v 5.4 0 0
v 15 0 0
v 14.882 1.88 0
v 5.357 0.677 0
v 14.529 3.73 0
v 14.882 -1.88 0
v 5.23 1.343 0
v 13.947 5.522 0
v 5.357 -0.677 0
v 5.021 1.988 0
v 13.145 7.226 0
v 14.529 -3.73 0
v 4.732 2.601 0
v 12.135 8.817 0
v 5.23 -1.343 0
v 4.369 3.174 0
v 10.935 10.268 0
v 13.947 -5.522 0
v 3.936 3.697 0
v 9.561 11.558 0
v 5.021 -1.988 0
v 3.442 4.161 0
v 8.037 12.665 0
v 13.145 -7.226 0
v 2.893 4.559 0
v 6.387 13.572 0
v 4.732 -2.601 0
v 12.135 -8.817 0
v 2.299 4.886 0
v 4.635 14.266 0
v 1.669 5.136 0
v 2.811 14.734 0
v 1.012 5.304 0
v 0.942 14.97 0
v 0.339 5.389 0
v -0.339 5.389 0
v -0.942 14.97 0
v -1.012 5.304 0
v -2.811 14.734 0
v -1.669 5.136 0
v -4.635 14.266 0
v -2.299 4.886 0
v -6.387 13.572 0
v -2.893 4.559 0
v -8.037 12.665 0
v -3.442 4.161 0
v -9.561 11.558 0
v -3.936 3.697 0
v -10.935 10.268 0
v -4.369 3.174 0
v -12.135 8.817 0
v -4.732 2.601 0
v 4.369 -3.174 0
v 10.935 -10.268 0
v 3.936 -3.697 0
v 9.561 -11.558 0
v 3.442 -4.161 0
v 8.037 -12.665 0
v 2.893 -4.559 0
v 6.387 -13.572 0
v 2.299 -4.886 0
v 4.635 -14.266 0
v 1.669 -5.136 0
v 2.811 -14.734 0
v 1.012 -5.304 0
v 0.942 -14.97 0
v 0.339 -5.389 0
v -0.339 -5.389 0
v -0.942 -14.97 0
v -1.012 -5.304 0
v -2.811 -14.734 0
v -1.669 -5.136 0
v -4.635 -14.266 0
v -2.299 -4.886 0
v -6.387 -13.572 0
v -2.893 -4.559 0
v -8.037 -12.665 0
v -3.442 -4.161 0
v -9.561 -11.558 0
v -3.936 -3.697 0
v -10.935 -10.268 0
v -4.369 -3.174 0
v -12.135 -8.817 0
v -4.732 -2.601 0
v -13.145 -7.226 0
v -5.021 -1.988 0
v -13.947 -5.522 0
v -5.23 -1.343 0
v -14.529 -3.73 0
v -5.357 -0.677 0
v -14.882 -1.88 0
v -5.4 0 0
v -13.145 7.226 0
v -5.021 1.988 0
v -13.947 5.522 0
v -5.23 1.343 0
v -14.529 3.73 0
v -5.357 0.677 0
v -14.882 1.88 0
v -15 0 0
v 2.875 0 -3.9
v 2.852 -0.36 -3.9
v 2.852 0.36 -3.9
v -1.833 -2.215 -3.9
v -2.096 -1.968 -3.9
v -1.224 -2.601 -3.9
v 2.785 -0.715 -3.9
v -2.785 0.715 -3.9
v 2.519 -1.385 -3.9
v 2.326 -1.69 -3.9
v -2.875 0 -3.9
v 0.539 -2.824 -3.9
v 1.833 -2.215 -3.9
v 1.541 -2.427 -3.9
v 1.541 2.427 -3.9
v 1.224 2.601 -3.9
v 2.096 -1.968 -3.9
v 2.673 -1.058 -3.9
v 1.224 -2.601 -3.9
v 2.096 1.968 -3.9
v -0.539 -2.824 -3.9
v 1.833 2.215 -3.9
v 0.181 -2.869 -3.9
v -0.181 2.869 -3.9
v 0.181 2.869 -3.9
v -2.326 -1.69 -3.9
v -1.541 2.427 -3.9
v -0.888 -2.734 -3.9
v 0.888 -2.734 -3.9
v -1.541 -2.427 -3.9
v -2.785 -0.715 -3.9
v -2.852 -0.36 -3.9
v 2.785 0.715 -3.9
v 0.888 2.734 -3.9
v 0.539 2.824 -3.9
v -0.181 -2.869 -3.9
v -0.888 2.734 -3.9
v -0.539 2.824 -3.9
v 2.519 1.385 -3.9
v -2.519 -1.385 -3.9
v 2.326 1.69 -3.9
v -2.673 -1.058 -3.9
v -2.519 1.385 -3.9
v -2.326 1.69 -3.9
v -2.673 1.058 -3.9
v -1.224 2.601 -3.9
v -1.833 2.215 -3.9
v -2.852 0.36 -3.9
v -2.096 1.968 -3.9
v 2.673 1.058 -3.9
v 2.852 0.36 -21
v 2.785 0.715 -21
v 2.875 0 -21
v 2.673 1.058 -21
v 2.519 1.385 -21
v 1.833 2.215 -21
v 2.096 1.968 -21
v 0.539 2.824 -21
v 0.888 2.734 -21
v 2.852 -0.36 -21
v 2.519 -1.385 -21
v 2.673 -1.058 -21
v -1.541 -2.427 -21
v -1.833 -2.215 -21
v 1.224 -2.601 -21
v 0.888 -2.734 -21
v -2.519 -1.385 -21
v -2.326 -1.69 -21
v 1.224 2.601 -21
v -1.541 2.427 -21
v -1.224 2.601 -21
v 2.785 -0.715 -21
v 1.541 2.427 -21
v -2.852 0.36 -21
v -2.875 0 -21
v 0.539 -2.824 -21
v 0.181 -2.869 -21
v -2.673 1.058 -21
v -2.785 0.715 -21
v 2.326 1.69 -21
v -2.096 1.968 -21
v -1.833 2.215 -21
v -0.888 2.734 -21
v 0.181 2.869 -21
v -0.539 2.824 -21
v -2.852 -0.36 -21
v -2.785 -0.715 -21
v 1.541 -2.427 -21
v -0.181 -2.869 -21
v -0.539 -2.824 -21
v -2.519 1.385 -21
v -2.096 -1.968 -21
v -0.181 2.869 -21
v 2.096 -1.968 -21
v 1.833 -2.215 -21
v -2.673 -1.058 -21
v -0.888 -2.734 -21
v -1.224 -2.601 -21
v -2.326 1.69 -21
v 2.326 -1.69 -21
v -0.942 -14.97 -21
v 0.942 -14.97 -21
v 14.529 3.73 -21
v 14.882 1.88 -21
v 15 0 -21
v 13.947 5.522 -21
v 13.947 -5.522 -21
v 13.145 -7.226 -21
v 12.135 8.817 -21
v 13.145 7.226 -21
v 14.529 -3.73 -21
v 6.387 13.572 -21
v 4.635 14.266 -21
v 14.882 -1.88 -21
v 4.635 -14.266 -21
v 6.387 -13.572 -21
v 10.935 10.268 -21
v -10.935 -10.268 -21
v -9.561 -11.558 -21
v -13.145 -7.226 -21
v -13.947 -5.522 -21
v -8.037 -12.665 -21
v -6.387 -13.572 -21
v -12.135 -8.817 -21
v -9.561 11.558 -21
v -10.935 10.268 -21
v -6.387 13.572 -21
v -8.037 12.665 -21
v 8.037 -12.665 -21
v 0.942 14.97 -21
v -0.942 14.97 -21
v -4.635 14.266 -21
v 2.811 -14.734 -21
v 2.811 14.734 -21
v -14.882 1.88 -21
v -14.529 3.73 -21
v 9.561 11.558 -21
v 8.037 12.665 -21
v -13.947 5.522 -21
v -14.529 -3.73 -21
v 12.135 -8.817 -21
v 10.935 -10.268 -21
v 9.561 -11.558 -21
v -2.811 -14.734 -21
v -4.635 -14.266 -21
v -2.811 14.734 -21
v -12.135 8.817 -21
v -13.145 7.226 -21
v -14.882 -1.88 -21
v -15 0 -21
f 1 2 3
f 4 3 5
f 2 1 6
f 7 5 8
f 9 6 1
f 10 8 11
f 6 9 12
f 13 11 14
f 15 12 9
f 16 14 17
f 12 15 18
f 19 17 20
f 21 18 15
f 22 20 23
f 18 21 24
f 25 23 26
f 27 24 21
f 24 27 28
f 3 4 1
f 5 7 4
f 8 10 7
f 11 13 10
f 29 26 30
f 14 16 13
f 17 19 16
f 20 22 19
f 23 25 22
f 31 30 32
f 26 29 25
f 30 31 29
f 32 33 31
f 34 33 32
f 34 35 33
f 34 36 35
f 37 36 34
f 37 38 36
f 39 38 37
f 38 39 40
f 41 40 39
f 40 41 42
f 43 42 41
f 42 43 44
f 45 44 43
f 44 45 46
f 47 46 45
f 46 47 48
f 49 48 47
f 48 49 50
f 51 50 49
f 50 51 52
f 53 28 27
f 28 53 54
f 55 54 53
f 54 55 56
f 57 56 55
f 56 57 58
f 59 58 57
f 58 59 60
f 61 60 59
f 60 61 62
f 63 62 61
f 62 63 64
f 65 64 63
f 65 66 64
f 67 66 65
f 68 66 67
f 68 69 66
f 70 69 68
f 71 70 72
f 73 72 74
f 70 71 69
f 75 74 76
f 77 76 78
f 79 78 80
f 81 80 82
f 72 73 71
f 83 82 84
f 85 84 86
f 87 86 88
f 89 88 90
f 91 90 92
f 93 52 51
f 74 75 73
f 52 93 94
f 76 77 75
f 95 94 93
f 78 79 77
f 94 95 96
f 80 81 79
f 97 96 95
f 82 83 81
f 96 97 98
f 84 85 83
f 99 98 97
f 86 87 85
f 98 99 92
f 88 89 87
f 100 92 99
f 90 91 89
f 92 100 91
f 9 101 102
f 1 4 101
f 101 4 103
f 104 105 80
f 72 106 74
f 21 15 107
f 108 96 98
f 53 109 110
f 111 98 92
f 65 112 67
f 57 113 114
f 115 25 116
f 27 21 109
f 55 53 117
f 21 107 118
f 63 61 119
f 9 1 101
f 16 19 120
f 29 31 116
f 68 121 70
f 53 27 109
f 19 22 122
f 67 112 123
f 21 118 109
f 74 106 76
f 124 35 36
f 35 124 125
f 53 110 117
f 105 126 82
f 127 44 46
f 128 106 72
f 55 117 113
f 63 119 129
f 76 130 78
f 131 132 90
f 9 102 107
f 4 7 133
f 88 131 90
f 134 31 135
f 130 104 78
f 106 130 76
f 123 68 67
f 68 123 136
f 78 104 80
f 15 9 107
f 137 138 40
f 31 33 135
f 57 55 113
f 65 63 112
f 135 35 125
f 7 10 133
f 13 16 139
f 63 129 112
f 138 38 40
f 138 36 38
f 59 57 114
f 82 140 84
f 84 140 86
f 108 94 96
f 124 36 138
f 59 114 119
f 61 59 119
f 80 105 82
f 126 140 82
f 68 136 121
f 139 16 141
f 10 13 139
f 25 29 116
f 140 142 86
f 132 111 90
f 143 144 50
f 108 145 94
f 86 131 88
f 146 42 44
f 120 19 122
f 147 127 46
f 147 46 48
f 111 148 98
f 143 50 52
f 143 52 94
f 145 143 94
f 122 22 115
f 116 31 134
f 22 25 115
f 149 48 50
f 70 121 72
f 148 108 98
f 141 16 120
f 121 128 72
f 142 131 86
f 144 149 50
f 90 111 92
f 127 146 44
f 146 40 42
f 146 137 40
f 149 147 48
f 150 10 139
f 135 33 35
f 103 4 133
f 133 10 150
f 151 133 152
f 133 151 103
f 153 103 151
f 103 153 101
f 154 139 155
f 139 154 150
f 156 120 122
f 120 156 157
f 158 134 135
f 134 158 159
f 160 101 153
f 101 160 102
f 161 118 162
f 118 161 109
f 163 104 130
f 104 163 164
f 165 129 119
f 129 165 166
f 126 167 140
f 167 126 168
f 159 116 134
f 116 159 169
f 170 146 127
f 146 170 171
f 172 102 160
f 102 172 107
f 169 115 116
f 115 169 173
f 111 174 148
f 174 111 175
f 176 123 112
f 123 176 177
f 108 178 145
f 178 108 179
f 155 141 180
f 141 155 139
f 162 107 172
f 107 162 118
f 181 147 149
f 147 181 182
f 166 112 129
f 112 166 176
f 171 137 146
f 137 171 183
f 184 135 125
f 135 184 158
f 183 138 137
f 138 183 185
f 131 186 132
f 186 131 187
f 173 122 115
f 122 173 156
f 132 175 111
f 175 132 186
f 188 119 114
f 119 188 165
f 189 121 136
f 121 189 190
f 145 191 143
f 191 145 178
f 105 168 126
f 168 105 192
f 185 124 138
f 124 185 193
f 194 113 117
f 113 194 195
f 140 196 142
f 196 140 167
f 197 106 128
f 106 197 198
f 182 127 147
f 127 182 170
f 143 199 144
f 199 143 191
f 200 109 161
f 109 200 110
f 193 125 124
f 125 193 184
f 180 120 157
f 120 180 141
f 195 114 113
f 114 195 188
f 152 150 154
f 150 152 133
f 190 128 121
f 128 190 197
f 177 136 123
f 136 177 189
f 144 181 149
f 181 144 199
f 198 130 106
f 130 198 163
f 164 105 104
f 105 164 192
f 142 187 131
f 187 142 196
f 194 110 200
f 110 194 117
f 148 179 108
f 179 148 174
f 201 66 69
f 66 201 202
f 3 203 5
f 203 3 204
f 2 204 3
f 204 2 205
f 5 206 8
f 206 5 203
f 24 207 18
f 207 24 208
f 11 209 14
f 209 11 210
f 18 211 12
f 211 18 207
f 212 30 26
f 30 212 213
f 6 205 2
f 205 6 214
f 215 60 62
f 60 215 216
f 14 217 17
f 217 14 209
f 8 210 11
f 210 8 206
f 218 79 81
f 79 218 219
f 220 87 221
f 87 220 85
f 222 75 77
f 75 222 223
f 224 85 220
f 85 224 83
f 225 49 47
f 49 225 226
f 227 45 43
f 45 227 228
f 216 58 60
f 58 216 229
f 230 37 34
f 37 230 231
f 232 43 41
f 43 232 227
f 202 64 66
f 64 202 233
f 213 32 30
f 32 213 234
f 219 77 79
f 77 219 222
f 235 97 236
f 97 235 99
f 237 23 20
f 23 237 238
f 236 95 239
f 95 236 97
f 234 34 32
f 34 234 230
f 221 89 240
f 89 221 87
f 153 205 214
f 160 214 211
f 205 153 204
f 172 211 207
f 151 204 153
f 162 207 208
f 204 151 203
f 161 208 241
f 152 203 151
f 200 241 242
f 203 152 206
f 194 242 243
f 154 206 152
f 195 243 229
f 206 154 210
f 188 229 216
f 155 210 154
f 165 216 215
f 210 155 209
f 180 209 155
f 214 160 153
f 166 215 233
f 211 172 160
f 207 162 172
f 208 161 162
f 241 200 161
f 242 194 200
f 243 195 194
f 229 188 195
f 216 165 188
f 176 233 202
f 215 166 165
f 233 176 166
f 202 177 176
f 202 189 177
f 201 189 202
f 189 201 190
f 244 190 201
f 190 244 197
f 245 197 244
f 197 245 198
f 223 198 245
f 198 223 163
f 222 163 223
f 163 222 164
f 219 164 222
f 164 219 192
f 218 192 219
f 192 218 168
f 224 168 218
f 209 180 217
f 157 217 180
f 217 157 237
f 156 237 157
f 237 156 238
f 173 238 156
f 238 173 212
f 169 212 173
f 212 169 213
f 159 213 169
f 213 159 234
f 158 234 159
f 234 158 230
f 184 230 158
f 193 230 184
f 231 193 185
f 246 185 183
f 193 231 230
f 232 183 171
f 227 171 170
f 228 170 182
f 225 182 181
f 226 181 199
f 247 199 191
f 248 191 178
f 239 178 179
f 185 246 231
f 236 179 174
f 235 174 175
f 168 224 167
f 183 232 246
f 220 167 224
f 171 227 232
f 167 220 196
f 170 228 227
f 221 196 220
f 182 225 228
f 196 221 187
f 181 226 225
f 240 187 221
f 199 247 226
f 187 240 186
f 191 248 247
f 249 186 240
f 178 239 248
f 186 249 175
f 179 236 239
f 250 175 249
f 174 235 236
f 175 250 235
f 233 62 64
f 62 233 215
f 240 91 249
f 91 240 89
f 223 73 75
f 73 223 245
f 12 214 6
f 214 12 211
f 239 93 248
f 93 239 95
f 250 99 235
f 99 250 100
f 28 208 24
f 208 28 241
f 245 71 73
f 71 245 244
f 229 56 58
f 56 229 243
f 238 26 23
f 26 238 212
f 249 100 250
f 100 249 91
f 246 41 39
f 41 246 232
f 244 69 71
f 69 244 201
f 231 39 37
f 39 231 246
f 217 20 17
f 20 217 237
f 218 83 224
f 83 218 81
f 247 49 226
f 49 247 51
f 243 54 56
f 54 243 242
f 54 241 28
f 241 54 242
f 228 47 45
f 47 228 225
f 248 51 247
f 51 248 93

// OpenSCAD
$fn = 50;

difference() {
	union() {
		translate(v = [0, 0, -21.0]) {
			cylinder(h = 21, r = 15.0);
		}
	}
	union() {
		translate(v = [0, 0, 0]) {
			rotate(a = [0, 0, 0]) {
				difference() {
					union() {
						translate(v = [0, 0, -24.0]) {
							cylinder(h = 24, r = 2.6);
						}
						translate(v = [0, 0, -3.9]) {
							cylinder(h = 3.9, r1 = 2.875, r2 = 5.4);
						}
						translate(v = [0, 0, -24.0]) {
							cylinder(h = 24, r = 2.875);
						}
						translate(v = [0, 0, -24.0]) {
							cylinder(h = 24, r = 2.6);
						}
					}
					union();
				}
			}
		}
	}
}
